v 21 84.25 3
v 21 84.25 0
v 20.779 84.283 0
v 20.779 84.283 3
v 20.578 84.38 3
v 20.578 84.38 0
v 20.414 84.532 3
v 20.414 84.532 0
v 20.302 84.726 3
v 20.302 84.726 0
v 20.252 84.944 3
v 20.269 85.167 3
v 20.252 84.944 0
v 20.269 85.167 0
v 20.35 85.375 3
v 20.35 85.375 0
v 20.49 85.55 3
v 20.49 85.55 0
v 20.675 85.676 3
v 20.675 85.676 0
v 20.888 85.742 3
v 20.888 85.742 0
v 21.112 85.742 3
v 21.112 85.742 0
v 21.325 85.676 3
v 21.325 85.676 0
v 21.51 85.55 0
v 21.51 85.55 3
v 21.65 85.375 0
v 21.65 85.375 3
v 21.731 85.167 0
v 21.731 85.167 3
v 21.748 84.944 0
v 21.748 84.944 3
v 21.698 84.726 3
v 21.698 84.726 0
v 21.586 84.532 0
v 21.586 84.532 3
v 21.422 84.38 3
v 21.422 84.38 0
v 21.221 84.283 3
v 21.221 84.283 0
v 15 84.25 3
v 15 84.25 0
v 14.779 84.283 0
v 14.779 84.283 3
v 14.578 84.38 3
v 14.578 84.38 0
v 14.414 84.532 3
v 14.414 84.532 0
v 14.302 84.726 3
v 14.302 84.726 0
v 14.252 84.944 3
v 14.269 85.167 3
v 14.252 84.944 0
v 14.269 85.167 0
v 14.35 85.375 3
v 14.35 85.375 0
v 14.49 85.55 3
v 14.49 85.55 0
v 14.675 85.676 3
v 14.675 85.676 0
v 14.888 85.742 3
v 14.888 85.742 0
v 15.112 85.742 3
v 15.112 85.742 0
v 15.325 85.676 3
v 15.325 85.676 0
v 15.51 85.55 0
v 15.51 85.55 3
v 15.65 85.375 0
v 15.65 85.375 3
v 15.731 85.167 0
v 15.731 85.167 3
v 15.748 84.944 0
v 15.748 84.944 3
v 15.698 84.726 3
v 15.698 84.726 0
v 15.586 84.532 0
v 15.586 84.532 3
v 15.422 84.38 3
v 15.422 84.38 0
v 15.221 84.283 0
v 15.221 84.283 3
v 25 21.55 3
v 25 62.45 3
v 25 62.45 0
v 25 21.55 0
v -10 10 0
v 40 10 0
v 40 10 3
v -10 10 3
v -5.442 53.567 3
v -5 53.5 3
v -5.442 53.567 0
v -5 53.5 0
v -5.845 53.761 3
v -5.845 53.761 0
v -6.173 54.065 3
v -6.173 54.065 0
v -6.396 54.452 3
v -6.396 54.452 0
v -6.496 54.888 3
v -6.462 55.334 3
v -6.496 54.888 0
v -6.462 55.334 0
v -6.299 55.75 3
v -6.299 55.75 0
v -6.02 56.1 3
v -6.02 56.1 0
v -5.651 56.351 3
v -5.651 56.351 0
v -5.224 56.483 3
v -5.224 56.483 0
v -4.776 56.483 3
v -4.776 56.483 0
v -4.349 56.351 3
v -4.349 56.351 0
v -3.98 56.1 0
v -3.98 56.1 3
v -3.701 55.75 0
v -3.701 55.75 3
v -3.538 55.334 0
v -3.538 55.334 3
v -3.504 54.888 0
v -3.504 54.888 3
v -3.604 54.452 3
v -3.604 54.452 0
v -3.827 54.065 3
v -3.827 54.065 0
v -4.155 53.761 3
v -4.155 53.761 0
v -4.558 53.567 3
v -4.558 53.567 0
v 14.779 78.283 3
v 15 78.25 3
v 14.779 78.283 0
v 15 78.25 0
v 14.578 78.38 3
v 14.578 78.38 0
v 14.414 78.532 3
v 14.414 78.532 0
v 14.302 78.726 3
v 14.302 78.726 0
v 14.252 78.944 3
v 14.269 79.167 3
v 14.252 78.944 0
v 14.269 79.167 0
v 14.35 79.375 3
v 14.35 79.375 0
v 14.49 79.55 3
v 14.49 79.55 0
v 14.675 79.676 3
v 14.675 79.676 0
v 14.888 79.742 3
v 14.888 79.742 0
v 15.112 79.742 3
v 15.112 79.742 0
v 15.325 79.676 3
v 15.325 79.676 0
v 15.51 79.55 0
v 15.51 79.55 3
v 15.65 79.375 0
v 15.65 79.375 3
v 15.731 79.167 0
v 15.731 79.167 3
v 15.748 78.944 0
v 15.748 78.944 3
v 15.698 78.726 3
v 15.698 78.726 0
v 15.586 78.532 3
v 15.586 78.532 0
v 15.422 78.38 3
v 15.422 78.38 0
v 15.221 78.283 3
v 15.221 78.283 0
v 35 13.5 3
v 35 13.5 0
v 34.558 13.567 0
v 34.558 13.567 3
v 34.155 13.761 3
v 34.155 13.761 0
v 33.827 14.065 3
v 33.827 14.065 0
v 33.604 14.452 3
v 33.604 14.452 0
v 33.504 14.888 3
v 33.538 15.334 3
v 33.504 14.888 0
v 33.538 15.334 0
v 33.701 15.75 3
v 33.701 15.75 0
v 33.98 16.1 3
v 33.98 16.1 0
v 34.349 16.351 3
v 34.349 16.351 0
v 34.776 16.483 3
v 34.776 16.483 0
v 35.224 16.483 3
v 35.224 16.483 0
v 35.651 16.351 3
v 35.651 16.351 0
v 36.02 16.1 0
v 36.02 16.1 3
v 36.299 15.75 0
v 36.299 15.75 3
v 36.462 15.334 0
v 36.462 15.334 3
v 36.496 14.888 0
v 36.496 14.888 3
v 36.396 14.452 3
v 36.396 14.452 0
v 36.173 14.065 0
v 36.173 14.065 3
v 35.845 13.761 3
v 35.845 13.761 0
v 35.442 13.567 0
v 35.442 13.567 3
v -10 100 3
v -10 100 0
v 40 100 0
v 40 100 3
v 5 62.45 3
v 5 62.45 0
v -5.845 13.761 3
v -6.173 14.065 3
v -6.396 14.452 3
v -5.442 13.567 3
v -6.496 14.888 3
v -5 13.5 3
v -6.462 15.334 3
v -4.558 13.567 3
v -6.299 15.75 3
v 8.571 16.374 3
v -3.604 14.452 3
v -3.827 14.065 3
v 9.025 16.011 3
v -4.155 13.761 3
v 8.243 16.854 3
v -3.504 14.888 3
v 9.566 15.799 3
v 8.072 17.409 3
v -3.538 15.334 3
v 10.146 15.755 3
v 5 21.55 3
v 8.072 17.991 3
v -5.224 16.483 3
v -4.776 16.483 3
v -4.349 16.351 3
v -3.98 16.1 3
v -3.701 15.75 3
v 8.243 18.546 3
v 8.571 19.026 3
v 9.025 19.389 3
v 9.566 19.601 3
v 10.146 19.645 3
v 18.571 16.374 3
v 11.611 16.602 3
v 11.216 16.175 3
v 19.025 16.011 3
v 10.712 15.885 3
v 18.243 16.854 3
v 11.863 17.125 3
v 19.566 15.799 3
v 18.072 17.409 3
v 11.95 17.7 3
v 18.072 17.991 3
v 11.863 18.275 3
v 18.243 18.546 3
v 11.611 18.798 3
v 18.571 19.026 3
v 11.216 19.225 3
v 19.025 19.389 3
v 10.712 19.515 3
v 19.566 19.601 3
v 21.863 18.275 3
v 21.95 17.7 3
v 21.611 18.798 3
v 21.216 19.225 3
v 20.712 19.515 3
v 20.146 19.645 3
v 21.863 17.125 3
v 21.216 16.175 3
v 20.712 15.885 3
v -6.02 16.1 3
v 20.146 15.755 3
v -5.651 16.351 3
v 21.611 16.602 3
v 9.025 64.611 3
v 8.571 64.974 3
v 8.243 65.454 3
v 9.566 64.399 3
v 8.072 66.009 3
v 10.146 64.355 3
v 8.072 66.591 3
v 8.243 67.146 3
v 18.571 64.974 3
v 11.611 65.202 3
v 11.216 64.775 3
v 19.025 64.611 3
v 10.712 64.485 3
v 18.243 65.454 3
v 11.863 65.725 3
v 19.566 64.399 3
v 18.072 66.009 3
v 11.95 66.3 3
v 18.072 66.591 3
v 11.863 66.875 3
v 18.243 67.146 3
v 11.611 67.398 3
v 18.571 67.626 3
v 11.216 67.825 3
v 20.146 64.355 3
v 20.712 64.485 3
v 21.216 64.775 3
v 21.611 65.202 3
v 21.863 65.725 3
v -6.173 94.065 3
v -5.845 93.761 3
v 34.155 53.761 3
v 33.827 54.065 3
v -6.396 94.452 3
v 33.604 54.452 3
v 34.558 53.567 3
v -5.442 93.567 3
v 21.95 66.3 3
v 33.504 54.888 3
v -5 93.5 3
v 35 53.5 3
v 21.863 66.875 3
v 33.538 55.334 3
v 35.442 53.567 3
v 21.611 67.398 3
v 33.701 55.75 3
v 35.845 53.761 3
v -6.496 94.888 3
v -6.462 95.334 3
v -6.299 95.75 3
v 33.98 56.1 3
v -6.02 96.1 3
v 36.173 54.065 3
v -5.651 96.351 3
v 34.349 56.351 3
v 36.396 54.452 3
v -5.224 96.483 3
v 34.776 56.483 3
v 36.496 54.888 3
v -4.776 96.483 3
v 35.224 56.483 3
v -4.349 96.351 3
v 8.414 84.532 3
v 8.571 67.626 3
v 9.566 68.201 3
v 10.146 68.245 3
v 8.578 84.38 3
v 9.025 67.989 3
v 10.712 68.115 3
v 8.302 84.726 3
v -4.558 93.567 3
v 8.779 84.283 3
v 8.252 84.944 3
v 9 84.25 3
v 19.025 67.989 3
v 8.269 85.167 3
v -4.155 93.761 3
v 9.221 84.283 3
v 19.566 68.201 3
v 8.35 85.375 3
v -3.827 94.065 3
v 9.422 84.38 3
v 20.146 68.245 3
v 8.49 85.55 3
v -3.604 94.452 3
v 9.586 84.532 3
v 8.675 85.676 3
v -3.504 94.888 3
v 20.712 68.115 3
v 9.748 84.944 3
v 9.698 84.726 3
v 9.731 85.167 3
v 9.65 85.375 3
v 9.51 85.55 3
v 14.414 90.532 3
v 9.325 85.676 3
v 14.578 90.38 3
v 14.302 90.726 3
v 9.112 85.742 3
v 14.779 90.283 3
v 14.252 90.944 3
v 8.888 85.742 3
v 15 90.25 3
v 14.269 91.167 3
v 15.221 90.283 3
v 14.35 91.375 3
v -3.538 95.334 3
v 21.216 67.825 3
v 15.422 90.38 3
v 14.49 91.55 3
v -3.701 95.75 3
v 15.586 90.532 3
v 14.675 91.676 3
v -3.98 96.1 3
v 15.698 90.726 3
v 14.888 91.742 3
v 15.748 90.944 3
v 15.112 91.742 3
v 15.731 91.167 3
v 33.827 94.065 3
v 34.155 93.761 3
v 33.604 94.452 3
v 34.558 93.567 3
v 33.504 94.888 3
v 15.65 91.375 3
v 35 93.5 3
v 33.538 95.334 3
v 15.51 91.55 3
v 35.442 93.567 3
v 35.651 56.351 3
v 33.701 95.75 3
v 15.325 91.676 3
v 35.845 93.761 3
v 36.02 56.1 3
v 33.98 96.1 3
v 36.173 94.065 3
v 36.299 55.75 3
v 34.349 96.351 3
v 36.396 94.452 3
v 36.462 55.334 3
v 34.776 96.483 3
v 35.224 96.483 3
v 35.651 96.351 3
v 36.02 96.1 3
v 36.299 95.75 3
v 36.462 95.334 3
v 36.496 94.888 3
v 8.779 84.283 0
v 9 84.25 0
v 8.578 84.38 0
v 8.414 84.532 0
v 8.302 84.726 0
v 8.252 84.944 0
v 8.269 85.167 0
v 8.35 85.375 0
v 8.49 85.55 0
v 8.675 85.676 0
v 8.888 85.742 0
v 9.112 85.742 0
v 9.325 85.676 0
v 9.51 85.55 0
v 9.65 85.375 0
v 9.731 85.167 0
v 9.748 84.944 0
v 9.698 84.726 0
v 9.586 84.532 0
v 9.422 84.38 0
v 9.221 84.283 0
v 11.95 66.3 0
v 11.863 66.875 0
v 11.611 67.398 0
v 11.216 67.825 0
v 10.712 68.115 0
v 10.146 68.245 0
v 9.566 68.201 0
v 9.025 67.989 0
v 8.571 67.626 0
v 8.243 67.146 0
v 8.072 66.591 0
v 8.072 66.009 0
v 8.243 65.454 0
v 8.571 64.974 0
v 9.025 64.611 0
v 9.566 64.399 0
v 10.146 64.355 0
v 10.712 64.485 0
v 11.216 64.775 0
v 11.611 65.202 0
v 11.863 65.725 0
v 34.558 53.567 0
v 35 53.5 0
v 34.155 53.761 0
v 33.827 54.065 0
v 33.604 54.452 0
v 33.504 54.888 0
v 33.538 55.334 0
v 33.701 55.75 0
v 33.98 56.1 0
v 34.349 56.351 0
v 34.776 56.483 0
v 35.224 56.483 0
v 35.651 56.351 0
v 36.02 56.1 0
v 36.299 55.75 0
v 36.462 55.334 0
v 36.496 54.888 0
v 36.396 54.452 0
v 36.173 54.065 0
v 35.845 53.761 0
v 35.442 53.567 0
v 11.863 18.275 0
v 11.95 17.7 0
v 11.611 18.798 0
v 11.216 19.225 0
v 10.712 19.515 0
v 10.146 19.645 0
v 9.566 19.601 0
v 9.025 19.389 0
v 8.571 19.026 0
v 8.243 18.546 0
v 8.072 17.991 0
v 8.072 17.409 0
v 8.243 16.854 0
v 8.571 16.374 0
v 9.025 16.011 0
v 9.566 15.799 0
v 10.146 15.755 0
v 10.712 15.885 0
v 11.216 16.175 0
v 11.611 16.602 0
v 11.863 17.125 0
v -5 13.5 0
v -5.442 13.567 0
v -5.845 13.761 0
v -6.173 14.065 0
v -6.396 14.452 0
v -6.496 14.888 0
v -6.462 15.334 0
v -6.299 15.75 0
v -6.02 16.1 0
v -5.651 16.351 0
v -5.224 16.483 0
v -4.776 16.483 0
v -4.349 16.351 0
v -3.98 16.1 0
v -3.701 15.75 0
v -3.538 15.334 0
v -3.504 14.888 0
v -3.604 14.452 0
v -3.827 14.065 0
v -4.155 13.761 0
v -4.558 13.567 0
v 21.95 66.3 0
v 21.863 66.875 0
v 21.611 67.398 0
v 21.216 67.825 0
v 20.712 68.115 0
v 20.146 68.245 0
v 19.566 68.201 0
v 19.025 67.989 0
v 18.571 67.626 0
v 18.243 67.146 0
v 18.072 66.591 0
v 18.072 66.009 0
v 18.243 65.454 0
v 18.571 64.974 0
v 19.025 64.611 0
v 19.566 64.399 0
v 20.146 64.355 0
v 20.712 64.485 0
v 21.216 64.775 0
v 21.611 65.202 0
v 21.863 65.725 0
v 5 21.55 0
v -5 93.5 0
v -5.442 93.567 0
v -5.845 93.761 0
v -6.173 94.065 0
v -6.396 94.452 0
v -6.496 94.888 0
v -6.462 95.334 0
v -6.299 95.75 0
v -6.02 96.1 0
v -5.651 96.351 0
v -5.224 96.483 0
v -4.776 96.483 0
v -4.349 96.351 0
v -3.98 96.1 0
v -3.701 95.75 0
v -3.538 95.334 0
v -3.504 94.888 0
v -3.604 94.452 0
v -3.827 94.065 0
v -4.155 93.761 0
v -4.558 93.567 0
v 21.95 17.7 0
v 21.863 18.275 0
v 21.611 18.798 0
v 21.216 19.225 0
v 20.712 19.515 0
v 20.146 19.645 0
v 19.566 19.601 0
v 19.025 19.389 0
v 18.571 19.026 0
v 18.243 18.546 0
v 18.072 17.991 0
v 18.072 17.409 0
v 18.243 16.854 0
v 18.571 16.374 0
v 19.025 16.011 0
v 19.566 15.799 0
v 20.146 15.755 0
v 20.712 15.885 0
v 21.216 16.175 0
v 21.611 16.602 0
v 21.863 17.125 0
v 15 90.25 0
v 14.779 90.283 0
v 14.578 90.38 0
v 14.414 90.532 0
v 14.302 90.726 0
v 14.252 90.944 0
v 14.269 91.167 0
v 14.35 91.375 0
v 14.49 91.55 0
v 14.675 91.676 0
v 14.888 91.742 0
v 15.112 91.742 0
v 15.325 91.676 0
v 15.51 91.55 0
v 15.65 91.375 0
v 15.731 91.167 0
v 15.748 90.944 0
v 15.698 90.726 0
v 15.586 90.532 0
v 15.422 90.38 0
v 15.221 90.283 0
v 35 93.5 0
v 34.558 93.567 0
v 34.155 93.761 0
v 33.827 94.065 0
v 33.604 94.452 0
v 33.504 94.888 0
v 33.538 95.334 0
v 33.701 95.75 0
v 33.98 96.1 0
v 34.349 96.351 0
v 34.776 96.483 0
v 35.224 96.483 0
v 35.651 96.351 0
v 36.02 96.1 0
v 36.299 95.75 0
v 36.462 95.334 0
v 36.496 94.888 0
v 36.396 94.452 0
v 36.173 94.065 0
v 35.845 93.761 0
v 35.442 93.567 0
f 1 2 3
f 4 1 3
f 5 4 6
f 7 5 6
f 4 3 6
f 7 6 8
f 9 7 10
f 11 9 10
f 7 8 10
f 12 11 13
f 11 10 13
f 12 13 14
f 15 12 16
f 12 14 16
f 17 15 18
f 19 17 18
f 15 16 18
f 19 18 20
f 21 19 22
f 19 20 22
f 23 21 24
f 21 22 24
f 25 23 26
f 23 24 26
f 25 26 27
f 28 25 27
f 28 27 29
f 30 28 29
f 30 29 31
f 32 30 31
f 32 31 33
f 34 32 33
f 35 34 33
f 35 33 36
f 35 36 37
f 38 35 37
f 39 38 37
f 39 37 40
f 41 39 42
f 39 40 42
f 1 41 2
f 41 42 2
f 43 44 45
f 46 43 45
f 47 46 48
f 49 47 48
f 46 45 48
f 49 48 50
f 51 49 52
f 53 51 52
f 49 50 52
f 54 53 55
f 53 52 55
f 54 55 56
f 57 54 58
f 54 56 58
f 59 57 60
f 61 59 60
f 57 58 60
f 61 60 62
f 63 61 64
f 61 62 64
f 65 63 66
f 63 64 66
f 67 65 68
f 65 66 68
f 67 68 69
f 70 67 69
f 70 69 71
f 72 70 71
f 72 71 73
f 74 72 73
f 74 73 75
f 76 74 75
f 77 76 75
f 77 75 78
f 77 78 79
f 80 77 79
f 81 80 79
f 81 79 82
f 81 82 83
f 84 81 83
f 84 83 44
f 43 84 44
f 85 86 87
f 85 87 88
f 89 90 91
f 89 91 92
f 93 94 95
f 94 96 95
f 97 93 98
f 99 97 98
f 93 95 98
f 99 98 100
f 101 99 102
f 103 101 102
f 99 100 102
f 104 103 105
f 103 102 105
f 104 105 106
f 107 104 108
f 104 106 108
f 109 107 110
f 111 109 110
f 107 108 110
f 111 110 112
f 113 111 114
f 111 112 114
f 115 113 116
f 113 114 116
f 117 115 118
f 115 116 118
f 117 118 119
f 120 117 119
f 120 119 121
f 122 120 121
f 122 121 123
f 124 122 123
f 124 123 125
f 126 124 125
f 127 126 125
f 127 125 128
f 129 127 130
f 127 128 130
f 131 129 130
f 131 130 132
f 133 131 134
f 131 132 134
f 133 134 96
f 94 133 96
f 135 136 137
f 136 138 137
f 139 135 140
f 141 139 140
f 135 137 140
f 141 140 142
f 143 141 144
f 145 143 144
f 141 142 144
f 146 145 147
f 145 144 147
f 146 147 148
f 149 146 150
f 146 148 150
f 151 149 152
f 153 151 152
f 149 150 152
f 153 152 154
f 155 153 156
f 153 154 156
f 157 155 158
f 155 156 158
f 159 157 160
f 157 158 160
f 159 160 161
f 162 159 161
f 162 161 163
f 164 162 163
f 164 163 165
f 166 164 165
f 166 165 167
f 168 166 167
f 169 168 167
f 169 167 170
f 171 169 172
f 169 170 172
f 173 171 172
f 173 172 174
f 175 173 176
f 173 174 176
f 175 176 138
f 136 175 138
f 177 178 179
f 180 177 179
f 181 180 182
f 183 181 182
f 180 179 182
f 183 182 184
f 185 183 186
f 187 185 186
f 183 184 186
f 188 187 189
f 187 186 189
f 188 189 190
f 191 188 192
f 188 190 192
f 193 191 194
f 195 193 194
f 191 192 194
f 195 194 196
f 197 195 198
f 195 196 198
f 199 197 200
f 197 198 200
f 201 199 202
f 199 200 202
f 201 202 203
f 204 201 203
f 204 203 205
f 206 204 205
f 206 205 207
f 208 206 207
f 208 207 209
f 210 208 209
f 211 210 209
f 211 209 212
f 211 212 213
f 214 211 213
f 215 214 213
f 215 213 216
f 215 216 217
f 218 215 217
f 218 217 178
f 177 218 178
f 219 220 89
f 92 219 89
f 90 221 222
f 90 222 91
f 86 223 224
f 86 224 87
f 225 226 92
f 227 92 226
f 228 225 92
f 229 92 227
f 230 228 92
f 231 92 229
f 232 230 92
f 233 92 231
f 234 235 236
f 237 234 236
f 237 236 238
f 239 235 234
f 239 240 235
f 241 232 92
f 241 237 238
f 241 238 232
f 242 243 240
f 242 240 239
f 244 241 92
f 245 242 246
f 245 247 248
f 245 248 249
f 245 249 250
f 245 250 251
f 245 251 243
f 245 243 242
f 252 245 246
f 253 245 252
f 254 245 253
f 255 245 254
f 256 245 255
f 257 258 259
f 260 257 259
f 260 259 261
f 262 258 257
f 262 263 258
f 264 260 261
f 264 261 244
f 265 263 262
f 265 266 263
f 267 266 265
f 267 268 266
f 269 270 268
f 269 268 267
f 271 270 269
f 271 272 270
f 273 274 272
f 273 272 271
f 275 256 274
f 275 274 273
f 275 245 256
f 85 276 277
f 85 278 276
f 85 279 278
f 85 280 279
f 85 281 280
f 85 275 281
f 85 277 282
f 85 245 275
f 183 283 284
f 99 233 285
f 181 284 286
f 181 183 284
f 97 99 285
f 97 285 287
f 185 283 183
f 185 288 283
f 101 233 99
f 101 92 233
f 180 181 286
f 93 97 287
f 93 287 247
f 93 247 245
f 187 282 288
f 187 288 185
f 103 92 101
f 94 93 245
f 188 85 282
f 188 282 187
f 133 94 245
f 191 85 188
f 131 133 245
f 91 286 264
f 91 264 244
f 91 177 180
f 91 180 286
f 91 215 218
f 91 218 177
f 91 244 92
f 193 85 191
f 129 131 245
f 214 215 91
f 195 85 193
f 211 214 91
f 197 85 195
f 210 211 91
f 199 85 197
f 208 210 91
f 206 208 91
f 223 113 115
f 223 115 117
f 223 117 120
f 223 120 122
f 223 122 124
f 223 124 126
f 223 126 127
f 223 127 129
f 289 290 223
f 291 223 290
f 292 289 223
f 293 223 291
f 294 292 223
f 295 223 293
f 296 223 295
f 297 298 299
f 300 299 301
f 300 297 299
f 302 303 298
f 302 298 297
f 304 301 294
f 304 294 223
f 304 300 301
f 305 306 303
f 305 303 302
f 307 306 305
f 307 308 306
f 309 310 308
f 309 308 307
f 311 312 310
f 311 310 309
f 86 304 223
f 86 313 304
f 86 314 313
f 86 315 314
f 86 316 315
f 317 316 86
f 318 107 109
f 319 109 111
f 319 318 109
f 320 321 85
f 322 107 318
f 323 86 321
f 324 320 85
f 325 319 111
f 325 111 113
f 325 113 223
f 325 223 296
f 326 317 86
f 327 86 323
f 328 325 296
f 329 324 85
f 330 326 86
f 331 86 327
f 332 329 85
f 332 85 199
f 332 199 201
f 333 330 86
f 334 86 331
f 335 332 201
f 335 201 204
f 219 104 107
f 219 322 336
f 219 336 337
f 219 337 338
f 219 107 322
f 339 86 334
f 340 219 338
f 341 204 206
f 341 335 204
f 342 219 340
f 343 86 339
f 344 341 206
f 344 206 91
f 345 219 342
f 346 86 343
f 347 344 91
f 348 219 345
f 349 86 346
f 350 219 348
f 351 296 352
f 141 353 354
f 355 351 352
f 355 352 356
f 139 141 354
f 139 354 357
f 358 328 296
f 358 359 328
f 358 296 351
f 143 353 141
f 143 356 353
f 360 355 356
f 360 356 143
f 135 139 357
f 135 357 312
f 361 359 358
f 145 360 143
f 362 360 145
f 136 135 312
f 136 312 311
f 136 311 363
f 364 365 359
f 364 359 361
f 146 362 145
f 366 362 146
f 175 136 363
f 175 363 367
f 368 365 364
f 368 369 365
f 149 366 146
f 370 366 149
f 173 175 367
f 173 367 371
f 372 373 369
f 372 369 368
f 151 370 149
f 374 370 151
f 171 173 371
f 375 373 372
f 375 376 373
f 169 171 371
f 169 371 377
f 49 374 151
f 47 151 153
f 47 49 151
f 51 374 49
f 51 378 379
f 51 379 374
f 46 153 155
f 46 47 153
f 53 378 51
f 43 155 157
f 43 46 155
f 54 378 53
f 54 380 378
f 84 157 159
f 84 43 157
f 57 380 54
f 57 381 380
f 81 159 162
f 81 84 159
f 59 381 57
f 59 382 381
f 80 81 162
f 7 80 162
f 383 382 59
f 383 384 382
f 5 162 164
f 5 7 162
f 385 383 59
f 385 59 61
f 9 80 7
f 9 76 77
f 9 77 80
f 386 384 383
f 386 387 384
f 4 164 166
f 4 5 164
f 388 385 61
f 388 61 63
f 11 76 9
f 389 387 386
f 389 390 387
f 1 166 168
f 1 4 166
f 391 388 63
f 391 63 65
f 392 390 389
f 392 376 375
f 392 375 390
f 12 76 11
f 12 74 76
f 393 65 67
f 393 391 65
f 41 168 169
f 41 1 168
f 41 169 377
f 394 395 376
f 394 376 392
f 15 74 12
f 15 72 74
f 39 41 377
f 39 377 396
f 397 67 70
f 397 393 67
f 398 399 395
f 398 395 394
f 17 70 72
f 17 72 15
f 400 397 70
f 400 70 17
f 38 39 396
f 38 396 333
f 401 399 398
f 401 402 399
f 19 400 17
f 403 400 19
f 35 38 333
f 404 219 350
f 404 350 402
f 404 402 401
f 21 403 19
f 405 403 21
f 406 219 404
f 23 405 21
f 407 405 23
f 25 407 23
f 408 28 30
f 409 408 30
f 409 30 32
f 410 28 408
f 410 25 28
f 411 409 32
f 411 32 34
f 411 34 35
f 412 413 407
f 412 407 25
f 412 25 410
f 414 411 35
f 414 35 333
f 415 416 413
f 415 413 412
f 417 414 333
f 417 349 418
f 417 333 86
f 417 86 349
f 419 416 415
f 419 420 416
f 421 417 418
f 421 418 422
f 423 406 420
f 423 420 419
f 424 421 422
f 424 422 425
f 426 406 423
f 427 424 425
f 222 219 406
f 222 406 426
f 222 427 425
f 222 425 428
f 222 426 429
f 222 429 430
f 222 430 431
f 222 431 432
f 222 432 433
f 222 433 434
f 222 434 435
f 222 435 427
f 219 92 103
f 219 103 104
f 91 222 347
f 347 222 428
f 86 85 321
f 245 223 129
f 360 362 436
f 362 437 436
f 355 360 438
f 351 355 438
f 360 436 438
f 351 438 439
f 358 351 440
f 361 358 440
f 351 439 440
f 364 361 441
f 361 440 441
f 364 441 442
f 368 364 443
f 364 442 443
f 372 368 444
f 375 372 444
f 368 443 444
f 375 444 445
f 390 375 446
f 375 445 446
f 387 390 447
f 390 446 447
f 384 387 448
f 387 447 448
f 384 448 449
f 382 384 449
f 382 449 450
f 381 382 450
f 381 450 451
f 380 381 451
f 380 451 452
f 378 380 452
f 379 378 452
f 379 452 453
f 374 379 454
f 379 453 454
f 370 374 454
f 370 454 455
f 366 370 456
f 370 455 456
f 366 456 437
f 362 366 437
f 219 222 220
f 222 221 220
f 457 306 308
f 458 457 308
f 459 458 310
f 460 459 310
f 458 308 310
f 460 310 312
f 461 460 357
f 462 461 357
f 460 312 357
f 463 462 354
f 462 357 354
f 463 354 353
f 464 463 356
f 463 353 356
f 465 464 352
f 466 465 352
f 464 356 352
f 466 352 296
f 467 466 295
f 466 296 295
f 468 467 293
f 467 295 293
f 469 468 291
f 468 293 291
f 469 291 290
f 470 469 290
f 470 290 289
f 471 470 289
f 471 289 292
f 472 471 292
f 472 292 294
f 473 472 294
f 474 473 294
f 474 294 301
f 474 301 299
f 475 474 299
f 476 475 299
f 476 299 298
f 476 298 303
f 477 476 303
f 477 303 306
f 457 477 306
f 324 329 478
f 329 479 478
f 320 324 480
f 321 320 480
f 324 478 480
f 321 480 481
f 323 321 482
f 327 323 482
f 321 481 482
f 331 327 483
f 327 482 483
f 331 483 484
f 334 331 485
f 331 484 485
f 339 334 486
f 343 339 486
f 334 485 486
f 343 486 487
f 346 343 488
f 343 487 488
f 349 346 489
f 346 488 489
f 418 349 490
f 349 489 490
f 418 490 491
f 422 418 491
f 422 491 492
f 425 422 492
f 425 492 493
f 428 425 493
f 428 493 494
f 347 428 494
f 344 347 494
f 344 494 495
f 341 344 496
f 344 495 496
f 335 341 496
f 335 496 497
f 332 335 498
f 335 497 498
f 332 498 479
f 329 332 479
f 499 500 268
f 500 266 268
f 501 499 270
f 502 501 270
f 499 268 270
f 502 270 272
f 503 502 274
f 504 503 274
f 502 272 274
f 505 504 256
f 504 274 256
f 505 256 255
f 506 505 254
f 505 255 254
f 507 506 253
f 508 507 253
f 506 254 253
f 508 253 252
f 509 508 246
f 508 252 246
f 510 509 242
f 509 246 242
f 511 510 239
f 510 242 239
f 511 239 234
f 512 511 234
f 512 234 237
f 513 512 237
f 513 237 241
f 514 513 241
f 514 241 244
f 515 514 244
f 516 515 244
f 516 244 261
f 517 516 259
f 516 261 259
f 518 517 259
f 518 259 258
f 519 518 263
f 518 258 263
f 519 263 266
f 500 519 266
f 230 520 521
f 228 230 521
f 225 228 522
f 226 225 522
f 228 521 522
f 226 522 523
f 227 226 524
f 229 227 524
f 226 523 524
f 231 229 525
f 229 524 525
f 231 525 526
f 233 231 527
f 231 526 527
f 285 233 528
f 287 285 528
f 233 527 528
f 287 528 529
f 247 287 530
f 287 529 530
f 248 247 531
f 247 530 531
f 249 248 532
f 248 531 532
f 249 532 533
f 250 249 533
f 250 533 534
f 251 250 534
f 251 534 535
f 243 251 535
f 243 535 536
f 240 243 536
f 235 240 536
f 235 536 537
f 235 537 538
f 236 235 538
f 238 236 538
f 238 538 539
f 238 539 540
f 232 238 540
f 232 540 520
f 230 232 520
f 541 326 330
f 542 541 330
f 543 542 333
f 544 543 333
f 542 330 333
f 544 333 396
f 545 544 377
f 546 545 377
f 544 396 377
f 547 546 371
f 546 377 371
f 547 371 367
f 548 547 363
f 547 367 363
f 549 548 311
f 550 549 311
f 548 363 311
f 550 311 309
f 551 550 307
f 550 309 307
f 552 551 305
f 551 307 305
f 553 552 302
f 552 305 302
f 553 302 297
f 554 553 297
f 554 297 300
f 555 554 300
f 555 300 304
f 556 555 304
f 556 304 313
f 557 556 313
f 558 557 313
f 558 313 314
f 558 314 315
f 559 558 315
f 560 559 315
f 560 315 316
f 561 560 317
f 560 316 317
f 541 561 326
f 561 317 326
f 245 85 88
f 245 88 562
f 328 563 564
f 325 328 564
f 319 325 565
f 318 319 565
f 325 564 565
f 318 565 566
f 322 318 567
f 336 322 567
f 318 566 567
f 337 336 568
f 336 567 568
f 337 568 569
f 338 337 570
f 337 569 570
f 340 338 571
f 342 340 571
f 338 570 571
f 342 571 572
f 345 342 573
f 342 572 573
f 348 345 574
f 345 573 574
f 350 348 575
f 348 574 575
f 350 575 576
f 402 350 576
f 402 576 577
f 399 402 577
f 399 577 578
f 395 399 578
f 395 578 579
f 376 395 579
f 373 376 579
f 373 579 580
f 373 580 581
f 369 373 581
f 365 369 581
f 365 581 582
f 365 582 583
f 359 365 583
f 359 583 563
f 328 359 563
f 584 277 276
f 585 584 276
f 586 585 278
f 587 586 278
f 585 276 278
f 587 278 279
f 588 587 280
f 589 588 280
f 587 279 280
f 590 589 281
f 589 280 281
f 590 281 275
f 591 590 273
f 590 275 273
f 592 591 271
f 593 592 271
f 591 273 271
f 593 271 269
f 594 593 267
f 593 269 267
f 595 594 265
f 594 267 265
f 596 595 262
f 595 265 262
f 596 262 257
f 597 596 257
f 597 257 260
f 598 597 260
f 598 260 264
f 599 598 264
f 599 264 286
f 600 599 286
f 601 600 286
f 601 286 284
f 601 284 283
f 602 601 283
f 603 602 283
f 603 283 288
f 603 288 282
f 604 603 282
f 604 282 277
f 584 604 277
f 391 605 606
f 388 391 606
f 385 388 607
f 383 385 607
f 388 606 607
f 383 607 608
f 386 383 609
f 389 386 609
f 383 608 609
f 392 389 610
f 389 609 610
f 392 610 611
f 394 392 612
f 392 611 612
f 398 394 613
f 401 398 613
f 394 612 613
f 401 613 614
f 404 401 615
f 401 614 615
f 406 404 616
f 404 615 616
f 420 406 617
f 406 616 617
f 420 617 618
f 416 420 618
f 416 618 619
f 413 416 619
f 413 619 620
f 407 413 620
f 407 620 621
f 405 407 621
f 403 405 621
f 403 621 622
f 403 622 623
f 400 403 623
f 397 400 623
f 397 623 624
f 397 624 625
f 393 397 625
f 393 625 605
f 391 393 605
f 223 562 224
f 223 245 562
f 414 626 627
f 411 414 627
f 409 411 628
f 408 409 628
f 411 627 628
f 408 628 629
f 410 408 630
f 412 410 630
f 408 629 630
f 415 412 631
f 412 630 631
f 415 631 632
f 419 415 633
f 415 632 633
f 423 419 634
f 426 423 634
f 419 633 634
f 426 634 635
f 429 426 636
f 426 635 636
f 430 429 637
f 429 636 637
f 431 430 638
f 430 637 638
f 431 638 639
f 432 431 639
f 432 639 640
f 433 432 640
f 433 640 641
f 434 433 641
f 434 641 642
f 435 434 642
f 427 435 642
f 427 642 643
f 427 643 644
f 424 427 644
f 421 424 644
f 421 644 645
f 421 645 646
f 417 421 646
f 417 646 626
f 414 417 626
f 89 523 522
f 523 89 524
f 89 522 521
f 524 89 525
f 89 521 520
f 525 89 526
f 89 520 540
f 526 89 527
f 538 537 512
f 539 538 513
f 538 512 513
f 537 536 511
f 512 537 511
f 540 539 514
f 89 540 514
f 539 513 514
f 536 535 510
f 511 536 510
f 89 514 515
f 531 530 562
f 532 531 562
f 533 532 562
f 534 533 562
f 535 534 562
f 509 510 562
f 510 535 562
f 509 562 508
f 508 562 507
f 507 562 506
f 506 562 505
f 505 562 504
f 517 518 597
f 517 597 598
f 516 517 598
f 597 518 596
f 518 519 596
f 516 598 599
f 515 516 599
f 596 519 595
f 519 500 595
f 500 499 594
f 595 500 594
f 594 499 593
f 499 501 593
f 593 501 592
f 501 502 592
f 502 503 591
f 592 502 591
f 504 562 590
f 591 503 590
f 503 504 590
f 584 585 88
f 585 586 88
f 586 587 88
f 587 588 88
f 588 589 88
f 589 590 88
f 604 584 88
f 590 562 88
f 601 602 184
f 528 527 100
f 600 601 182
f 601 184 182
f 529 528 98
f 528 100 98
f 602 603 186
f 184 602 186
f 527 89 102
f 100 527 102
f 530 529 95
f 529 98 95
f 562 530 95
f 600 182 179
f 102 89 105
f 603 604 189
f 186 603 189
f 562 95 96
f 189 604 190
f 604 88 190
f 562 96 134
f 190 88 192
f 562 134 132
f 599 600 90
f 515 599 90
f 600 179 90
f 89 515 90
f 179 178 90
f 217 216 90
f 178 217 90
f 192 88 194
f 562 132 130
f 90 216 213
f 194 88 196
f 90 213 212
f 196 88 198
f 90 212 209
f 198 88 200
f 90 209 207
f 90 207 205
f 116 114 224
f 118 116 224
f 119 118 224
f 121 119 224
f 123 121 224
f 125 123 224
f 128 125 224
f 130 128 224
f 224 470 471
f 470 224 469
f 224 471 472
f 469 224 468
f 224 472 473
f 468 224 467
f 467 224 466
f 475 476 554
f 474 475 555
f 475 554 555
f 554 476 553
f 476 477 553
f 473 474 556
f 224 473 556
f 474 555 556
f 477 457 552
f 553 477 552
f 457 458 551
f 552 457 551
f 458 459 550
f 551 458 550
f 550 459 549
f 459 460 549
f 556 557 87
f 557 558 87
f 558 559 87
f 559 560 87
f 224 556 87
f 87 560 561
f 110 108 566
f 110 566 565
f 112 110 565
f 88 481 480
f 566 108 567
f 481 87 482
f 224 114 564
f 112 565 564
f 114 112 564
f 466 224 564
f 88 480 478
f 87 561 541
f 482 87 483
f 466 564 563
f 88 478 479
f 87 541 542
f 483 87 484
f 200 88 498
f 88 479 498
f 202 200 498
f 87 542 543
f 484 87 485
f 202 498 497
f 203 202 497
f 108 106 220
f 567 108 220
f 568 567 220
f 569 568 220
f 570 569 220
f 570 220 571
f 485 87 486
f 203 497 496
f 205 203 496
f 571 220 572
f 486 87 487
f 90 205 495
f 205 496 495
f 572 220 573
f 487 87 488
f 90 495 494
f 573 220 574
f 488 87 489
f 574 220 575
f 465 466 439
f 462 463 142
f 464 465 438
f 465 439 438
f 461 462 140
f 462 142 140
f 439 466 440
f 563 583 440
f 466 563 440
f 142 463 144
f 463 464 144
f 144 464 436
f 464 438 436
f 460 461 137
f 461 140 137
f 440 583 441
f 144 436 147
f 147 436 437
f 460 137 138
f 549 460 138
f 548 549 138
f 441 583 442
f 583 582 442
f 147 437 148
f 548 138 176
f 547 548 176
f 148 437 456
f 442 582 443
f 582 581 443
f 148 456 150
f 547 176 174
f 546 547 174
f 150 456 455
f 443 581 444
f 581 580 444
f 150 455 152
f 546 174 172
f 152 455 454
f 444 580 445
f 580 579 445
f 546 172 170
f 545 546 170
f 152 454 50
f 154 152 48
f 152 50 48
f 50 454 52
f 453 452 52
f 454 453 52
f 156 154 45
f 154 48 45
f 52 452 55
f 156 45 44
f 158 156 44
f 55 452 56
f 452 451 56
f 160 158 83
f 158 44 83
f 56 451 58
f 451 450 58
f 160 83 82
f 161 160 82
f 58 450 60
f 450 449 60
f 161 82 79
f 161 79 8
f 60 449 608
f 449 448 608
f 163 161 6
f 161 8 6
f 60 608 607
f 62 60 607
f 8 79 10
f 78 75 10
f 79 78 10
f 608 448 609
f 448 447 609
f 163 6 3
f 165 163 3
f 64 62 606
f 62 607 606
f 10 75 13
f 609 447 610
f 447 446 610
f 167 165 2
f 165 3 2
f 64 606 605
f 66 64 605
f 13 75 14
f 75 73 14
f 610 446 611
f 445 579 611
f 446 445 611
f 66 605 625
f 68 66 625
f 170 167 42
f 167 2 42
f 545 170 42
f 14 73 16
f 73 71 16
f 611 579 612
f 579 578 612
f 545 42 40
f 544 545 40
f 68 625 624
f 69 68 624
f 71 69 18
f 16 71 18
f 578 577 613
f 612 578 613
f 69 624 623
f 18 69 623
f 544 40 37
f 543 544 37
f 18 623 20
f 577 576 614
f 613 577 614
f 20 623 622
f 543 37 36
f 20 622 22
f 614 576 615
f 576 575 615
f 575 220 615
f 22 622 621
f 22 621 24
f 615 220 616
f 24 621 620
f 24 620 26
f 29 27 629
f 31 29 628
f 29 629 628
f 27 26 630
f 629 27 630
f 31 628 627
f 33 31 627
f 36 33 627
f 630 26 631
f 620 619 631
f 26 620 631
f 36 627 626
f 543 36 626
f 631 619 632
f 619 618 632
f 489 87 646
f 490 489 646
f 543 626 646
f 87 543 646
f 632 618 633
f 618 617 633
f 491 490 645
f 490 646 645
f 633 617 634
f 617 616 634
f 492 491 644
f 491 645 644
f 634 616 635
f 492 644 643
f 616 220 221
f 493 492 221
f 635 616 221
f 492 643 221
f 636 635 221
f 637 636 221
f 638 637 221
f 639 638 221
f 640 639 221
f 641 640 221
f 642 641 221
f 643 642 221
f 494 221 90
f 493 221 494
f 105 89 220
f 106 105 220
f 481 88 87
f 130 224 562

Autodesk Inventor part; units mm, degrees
ref_plane "YZ Plane" through (0, 0, 0) normal (1, 0, 0) x (0, 1, 0)
ref_plane "XZ Plane" through (0, 0, 0) normal (0, 1, 0) x (-1, 0, 0)
ref_plane "XY Plane" through (0, 0, 0) normal (0, 0, 1) x (1, 0, 0)
sketch "スケッチ6" plane through (0, 0, 0) normal (0, 0, 1) x (1, 0, 0)
  line L0 (30, 10) -> (30, 100)
  line L1 (30, 100) -> (0, 100)
  line L2 (0, 100) -> (0, 0)
  line L3 (0, 100) -> (-10, 100)
  line L4 (-10, 100) -> (-10, 90)
  line L5 (-10, 90) -> (0, 90)
  line L6 (0, 90) -> (0, 100)
  line L7 (30, 100) -> (40, 100)
  line L8 (40, 100) -> (40, 90)
  line L9 (40, 90) -> (30, 90)
  line L10 (30, 90) -> (30, 100)
  line L11 (0, 50) -> (-10, 50)
  line L12 (-10, 50) -> (-10, 60)
  line L13 (-10, 60) -> (0, 60)
  line L14 (0, 60) -> (0, 50)
  line L15 (30, 50) -> (40, 50)
  line L16 (40, 50) -> (40, 60)
  line L17 (40, 60) -> (30, 60)
  line L18 (30, 60) -> (30, 50)
  line L19 (0, 20) -> (-10, 20)
  line L20 (-10, 20) -> (-10, 10)
  line L21 (-10, 10) -> (0, 10)
  line L22 (0, 10) -> (0, 20)
  line L23 (30, 20) -> (40, 20)
  line L24 (40, 20) -> (40, 10)
  line L25 (40, 10) -> (30, 10)
  line L26 (30, 10) -> (30, 20)
  line L27 (0, 100) -> (30, 100)
  line L28 (30, 100) -> (30, 10)
  line L29 (30, 10) -> (0, 10)
  line L30 (0, 10) -> (0, 100)
  line L31 (-10, 100) -> (40, 100)
  line L32 (40, 100) -> (40, 10)
  line L33 (40, 10) -> (-10, 10)
  line L34 (-10, 10) -> (-10, 100)
  point P0 (0, 90)
  point P1 (30, 55)
  point P2 (0, 10)
  point P3 (0, 10)
  point P4 (0, 60)
  dimension "d73" = 30
  dimension "d117" = 10
  dimension "d118" = 10
  dimension "d119" = 10
  dimension "d120" = 10
  dimension "d141" = 10
  dimension "d142" = 0
  dimension "d143" = 30
  dimension "d144" = 10
  dimension "d145" = 10
  dimension "d146" = 10
  dimension "d147" = 10
  dimension "d149" = 30
  dimension "d167" = 90
extrude "押し出し5" add sketch "スケッチ6" along normal blind 3
sketch "スケッチ7" plane through (0, 0, 3) normal (0, 0, 1) x (1, 0, 0)
  line L0 (30, 90) -> (30, 90) projected
  circle A0 centre (15, 85) radius 6
  line L1 (15, 85) -> (15, 104.27)
  line L2 (40, 100) -> (-10, 100) projected
  point P0 (0, 0)
  point P1 (30, 0)
  point P2 (15, 91)
  point P3 (9, 85)
  point P4 (15, 79)
  point P5 (21, 85)
  point P6 (30, 10)
  point P7 (15, 100)
  dimension "d79" = 12
  dimension "d82" = 360
  dimension "d156" = 0
hole "穴2" at (15, 85, 3) at (15, 91, 3) at (9, 85, 3) at (15, 79, 3) at (21, 85, 3) direction (0, 0, -1) diameter 1.5 end through all
sketch "スケッチ8" plane through (0, 0, 3) normal (0, 0, 1) x (1, 0, 0)
  line L0 (5, 69) -> (25, 69)
  line L1 (25, 69) -> (25, 15)
  line L2 (25, 15) -> (5, 15)
  line L3 (5, 15) -> (5, 69)
  line L4 (5, 62.45) -> (25, 62.45)
  line L5 (25, 62.45) -> (25, 21.55)
  line L6 (25, 21.55) -> (5, 21.55)
  line L7 (5, 21.55) -> (5, 62.45)
  circle A0 centre (10, 66.3) radius 1.95
  circle A1 centre (20, 66.3) radius 1.95
  circle A2 centre (10, 17.7) radius 1.95
  circle A3 centre (20, 17.7) radius 1.95
  line L8 (-10, 10) -> (40, 10) projected
  line L9 (-10, 100) -> (-10, 10) projected
  point P0 (0, 100)
  point P1 (15, 21.55)
  point P2 (25, 62.45)
  dimension "d91" = 20
  dimension "d93" = 54
  dimension "d96" = 10
  dimension "d98" = 48.6
  dimension "d99" = 2.7
  dimension "d100" = 5
  dimension "d101" = 40.9
  dimension "d102" = 6.55
  dimension "d105" = 3.9
  dimension "d106" = 3.9
  dimension "d107" = 3.9
  dimension "d151" = 3.9
  dimension "d152" = 10
  dimension "d153" = 5
  dimension "d154" = 2.7
  dimension "d168" = 5
  dimension "d169" = 15
extrude "押し出し6" cut sketch "スケッチ8" against normal blind 3 contours L4 L1 L6 L3 | A0 | A1 | A2 | A3
sketch "スケッチ9" plane through (0, 0, 3) normal (0, 0, 1) x (1, 0, 0)
  line L0 (-10, 100) -> (-10, 10) projected
  line L1 (40, 90) -> (40, 100) projected
  line L2 (40, 100) -> (-10, 100) projected
  line L3 (0, 60) -> (-10, 60) projected
  line L4 (40, 60) -> (30, 60) projected
  line L5 (40, 50) -> (40, 60) projected
  line L6 (-10, 60) -> (-10, 50) projected
  line L7 (-10, 20) -> (-10, 10) projected
  line L8 (0, 20) -> (-10, 20) projected
  line L9 (40, 20) -> (30, 20) projected
  line L10 (40, 10) -> (40, 20) projected
  point P0 (-5, 95)
  point P1 (35, 95)
  point P2 (-10, 90)
  point P3 (40, 95)
  point P4 (-5, 55)
  point P5 (35, 55)
  point P6 (35, 15)
  point P7 (-5, 15)
  dimension "d126" = 5
  dimension "d127" = 5
  dimension "d157" = 5
  dimension "d158" = 5
  dimension "d159" = 5
  dimension "d160" = 5
  dimension "d161" = 5
  dimension "d162" = 5
  dimension "d163" = 5
  dimension "d164" = 5
  dimension "d165" = 5
  dimension "d166" = 5
hole "穴3" at (-5, 95, 3) at (35, 95, 3) at (-5, 55, 3) at (35, 55, 3) at (35, 15, 3) at (-5, 15, 3) direction (0, 0, -1) diameter 3 end through all
equation "\"d120\" = d119"
equation "\"d141\" = d120"
equation "\"d144\" = d120"
equation "\"d145\" = d144"
equation "\"d147\" = d141"
equation "\"d149\" = d143"
equation "\"d98\" = d95"
equation "\"d151\" = d107"
equation "\"d127\" = d126"
equation "\"d159\" = d157"
equation "\"d160\" = d159"
equation "\"d164\" = d163"
equation "\"d165\" = d164"
equation "\"d95\" = 48.6"
properties part number "practice_parts01"
